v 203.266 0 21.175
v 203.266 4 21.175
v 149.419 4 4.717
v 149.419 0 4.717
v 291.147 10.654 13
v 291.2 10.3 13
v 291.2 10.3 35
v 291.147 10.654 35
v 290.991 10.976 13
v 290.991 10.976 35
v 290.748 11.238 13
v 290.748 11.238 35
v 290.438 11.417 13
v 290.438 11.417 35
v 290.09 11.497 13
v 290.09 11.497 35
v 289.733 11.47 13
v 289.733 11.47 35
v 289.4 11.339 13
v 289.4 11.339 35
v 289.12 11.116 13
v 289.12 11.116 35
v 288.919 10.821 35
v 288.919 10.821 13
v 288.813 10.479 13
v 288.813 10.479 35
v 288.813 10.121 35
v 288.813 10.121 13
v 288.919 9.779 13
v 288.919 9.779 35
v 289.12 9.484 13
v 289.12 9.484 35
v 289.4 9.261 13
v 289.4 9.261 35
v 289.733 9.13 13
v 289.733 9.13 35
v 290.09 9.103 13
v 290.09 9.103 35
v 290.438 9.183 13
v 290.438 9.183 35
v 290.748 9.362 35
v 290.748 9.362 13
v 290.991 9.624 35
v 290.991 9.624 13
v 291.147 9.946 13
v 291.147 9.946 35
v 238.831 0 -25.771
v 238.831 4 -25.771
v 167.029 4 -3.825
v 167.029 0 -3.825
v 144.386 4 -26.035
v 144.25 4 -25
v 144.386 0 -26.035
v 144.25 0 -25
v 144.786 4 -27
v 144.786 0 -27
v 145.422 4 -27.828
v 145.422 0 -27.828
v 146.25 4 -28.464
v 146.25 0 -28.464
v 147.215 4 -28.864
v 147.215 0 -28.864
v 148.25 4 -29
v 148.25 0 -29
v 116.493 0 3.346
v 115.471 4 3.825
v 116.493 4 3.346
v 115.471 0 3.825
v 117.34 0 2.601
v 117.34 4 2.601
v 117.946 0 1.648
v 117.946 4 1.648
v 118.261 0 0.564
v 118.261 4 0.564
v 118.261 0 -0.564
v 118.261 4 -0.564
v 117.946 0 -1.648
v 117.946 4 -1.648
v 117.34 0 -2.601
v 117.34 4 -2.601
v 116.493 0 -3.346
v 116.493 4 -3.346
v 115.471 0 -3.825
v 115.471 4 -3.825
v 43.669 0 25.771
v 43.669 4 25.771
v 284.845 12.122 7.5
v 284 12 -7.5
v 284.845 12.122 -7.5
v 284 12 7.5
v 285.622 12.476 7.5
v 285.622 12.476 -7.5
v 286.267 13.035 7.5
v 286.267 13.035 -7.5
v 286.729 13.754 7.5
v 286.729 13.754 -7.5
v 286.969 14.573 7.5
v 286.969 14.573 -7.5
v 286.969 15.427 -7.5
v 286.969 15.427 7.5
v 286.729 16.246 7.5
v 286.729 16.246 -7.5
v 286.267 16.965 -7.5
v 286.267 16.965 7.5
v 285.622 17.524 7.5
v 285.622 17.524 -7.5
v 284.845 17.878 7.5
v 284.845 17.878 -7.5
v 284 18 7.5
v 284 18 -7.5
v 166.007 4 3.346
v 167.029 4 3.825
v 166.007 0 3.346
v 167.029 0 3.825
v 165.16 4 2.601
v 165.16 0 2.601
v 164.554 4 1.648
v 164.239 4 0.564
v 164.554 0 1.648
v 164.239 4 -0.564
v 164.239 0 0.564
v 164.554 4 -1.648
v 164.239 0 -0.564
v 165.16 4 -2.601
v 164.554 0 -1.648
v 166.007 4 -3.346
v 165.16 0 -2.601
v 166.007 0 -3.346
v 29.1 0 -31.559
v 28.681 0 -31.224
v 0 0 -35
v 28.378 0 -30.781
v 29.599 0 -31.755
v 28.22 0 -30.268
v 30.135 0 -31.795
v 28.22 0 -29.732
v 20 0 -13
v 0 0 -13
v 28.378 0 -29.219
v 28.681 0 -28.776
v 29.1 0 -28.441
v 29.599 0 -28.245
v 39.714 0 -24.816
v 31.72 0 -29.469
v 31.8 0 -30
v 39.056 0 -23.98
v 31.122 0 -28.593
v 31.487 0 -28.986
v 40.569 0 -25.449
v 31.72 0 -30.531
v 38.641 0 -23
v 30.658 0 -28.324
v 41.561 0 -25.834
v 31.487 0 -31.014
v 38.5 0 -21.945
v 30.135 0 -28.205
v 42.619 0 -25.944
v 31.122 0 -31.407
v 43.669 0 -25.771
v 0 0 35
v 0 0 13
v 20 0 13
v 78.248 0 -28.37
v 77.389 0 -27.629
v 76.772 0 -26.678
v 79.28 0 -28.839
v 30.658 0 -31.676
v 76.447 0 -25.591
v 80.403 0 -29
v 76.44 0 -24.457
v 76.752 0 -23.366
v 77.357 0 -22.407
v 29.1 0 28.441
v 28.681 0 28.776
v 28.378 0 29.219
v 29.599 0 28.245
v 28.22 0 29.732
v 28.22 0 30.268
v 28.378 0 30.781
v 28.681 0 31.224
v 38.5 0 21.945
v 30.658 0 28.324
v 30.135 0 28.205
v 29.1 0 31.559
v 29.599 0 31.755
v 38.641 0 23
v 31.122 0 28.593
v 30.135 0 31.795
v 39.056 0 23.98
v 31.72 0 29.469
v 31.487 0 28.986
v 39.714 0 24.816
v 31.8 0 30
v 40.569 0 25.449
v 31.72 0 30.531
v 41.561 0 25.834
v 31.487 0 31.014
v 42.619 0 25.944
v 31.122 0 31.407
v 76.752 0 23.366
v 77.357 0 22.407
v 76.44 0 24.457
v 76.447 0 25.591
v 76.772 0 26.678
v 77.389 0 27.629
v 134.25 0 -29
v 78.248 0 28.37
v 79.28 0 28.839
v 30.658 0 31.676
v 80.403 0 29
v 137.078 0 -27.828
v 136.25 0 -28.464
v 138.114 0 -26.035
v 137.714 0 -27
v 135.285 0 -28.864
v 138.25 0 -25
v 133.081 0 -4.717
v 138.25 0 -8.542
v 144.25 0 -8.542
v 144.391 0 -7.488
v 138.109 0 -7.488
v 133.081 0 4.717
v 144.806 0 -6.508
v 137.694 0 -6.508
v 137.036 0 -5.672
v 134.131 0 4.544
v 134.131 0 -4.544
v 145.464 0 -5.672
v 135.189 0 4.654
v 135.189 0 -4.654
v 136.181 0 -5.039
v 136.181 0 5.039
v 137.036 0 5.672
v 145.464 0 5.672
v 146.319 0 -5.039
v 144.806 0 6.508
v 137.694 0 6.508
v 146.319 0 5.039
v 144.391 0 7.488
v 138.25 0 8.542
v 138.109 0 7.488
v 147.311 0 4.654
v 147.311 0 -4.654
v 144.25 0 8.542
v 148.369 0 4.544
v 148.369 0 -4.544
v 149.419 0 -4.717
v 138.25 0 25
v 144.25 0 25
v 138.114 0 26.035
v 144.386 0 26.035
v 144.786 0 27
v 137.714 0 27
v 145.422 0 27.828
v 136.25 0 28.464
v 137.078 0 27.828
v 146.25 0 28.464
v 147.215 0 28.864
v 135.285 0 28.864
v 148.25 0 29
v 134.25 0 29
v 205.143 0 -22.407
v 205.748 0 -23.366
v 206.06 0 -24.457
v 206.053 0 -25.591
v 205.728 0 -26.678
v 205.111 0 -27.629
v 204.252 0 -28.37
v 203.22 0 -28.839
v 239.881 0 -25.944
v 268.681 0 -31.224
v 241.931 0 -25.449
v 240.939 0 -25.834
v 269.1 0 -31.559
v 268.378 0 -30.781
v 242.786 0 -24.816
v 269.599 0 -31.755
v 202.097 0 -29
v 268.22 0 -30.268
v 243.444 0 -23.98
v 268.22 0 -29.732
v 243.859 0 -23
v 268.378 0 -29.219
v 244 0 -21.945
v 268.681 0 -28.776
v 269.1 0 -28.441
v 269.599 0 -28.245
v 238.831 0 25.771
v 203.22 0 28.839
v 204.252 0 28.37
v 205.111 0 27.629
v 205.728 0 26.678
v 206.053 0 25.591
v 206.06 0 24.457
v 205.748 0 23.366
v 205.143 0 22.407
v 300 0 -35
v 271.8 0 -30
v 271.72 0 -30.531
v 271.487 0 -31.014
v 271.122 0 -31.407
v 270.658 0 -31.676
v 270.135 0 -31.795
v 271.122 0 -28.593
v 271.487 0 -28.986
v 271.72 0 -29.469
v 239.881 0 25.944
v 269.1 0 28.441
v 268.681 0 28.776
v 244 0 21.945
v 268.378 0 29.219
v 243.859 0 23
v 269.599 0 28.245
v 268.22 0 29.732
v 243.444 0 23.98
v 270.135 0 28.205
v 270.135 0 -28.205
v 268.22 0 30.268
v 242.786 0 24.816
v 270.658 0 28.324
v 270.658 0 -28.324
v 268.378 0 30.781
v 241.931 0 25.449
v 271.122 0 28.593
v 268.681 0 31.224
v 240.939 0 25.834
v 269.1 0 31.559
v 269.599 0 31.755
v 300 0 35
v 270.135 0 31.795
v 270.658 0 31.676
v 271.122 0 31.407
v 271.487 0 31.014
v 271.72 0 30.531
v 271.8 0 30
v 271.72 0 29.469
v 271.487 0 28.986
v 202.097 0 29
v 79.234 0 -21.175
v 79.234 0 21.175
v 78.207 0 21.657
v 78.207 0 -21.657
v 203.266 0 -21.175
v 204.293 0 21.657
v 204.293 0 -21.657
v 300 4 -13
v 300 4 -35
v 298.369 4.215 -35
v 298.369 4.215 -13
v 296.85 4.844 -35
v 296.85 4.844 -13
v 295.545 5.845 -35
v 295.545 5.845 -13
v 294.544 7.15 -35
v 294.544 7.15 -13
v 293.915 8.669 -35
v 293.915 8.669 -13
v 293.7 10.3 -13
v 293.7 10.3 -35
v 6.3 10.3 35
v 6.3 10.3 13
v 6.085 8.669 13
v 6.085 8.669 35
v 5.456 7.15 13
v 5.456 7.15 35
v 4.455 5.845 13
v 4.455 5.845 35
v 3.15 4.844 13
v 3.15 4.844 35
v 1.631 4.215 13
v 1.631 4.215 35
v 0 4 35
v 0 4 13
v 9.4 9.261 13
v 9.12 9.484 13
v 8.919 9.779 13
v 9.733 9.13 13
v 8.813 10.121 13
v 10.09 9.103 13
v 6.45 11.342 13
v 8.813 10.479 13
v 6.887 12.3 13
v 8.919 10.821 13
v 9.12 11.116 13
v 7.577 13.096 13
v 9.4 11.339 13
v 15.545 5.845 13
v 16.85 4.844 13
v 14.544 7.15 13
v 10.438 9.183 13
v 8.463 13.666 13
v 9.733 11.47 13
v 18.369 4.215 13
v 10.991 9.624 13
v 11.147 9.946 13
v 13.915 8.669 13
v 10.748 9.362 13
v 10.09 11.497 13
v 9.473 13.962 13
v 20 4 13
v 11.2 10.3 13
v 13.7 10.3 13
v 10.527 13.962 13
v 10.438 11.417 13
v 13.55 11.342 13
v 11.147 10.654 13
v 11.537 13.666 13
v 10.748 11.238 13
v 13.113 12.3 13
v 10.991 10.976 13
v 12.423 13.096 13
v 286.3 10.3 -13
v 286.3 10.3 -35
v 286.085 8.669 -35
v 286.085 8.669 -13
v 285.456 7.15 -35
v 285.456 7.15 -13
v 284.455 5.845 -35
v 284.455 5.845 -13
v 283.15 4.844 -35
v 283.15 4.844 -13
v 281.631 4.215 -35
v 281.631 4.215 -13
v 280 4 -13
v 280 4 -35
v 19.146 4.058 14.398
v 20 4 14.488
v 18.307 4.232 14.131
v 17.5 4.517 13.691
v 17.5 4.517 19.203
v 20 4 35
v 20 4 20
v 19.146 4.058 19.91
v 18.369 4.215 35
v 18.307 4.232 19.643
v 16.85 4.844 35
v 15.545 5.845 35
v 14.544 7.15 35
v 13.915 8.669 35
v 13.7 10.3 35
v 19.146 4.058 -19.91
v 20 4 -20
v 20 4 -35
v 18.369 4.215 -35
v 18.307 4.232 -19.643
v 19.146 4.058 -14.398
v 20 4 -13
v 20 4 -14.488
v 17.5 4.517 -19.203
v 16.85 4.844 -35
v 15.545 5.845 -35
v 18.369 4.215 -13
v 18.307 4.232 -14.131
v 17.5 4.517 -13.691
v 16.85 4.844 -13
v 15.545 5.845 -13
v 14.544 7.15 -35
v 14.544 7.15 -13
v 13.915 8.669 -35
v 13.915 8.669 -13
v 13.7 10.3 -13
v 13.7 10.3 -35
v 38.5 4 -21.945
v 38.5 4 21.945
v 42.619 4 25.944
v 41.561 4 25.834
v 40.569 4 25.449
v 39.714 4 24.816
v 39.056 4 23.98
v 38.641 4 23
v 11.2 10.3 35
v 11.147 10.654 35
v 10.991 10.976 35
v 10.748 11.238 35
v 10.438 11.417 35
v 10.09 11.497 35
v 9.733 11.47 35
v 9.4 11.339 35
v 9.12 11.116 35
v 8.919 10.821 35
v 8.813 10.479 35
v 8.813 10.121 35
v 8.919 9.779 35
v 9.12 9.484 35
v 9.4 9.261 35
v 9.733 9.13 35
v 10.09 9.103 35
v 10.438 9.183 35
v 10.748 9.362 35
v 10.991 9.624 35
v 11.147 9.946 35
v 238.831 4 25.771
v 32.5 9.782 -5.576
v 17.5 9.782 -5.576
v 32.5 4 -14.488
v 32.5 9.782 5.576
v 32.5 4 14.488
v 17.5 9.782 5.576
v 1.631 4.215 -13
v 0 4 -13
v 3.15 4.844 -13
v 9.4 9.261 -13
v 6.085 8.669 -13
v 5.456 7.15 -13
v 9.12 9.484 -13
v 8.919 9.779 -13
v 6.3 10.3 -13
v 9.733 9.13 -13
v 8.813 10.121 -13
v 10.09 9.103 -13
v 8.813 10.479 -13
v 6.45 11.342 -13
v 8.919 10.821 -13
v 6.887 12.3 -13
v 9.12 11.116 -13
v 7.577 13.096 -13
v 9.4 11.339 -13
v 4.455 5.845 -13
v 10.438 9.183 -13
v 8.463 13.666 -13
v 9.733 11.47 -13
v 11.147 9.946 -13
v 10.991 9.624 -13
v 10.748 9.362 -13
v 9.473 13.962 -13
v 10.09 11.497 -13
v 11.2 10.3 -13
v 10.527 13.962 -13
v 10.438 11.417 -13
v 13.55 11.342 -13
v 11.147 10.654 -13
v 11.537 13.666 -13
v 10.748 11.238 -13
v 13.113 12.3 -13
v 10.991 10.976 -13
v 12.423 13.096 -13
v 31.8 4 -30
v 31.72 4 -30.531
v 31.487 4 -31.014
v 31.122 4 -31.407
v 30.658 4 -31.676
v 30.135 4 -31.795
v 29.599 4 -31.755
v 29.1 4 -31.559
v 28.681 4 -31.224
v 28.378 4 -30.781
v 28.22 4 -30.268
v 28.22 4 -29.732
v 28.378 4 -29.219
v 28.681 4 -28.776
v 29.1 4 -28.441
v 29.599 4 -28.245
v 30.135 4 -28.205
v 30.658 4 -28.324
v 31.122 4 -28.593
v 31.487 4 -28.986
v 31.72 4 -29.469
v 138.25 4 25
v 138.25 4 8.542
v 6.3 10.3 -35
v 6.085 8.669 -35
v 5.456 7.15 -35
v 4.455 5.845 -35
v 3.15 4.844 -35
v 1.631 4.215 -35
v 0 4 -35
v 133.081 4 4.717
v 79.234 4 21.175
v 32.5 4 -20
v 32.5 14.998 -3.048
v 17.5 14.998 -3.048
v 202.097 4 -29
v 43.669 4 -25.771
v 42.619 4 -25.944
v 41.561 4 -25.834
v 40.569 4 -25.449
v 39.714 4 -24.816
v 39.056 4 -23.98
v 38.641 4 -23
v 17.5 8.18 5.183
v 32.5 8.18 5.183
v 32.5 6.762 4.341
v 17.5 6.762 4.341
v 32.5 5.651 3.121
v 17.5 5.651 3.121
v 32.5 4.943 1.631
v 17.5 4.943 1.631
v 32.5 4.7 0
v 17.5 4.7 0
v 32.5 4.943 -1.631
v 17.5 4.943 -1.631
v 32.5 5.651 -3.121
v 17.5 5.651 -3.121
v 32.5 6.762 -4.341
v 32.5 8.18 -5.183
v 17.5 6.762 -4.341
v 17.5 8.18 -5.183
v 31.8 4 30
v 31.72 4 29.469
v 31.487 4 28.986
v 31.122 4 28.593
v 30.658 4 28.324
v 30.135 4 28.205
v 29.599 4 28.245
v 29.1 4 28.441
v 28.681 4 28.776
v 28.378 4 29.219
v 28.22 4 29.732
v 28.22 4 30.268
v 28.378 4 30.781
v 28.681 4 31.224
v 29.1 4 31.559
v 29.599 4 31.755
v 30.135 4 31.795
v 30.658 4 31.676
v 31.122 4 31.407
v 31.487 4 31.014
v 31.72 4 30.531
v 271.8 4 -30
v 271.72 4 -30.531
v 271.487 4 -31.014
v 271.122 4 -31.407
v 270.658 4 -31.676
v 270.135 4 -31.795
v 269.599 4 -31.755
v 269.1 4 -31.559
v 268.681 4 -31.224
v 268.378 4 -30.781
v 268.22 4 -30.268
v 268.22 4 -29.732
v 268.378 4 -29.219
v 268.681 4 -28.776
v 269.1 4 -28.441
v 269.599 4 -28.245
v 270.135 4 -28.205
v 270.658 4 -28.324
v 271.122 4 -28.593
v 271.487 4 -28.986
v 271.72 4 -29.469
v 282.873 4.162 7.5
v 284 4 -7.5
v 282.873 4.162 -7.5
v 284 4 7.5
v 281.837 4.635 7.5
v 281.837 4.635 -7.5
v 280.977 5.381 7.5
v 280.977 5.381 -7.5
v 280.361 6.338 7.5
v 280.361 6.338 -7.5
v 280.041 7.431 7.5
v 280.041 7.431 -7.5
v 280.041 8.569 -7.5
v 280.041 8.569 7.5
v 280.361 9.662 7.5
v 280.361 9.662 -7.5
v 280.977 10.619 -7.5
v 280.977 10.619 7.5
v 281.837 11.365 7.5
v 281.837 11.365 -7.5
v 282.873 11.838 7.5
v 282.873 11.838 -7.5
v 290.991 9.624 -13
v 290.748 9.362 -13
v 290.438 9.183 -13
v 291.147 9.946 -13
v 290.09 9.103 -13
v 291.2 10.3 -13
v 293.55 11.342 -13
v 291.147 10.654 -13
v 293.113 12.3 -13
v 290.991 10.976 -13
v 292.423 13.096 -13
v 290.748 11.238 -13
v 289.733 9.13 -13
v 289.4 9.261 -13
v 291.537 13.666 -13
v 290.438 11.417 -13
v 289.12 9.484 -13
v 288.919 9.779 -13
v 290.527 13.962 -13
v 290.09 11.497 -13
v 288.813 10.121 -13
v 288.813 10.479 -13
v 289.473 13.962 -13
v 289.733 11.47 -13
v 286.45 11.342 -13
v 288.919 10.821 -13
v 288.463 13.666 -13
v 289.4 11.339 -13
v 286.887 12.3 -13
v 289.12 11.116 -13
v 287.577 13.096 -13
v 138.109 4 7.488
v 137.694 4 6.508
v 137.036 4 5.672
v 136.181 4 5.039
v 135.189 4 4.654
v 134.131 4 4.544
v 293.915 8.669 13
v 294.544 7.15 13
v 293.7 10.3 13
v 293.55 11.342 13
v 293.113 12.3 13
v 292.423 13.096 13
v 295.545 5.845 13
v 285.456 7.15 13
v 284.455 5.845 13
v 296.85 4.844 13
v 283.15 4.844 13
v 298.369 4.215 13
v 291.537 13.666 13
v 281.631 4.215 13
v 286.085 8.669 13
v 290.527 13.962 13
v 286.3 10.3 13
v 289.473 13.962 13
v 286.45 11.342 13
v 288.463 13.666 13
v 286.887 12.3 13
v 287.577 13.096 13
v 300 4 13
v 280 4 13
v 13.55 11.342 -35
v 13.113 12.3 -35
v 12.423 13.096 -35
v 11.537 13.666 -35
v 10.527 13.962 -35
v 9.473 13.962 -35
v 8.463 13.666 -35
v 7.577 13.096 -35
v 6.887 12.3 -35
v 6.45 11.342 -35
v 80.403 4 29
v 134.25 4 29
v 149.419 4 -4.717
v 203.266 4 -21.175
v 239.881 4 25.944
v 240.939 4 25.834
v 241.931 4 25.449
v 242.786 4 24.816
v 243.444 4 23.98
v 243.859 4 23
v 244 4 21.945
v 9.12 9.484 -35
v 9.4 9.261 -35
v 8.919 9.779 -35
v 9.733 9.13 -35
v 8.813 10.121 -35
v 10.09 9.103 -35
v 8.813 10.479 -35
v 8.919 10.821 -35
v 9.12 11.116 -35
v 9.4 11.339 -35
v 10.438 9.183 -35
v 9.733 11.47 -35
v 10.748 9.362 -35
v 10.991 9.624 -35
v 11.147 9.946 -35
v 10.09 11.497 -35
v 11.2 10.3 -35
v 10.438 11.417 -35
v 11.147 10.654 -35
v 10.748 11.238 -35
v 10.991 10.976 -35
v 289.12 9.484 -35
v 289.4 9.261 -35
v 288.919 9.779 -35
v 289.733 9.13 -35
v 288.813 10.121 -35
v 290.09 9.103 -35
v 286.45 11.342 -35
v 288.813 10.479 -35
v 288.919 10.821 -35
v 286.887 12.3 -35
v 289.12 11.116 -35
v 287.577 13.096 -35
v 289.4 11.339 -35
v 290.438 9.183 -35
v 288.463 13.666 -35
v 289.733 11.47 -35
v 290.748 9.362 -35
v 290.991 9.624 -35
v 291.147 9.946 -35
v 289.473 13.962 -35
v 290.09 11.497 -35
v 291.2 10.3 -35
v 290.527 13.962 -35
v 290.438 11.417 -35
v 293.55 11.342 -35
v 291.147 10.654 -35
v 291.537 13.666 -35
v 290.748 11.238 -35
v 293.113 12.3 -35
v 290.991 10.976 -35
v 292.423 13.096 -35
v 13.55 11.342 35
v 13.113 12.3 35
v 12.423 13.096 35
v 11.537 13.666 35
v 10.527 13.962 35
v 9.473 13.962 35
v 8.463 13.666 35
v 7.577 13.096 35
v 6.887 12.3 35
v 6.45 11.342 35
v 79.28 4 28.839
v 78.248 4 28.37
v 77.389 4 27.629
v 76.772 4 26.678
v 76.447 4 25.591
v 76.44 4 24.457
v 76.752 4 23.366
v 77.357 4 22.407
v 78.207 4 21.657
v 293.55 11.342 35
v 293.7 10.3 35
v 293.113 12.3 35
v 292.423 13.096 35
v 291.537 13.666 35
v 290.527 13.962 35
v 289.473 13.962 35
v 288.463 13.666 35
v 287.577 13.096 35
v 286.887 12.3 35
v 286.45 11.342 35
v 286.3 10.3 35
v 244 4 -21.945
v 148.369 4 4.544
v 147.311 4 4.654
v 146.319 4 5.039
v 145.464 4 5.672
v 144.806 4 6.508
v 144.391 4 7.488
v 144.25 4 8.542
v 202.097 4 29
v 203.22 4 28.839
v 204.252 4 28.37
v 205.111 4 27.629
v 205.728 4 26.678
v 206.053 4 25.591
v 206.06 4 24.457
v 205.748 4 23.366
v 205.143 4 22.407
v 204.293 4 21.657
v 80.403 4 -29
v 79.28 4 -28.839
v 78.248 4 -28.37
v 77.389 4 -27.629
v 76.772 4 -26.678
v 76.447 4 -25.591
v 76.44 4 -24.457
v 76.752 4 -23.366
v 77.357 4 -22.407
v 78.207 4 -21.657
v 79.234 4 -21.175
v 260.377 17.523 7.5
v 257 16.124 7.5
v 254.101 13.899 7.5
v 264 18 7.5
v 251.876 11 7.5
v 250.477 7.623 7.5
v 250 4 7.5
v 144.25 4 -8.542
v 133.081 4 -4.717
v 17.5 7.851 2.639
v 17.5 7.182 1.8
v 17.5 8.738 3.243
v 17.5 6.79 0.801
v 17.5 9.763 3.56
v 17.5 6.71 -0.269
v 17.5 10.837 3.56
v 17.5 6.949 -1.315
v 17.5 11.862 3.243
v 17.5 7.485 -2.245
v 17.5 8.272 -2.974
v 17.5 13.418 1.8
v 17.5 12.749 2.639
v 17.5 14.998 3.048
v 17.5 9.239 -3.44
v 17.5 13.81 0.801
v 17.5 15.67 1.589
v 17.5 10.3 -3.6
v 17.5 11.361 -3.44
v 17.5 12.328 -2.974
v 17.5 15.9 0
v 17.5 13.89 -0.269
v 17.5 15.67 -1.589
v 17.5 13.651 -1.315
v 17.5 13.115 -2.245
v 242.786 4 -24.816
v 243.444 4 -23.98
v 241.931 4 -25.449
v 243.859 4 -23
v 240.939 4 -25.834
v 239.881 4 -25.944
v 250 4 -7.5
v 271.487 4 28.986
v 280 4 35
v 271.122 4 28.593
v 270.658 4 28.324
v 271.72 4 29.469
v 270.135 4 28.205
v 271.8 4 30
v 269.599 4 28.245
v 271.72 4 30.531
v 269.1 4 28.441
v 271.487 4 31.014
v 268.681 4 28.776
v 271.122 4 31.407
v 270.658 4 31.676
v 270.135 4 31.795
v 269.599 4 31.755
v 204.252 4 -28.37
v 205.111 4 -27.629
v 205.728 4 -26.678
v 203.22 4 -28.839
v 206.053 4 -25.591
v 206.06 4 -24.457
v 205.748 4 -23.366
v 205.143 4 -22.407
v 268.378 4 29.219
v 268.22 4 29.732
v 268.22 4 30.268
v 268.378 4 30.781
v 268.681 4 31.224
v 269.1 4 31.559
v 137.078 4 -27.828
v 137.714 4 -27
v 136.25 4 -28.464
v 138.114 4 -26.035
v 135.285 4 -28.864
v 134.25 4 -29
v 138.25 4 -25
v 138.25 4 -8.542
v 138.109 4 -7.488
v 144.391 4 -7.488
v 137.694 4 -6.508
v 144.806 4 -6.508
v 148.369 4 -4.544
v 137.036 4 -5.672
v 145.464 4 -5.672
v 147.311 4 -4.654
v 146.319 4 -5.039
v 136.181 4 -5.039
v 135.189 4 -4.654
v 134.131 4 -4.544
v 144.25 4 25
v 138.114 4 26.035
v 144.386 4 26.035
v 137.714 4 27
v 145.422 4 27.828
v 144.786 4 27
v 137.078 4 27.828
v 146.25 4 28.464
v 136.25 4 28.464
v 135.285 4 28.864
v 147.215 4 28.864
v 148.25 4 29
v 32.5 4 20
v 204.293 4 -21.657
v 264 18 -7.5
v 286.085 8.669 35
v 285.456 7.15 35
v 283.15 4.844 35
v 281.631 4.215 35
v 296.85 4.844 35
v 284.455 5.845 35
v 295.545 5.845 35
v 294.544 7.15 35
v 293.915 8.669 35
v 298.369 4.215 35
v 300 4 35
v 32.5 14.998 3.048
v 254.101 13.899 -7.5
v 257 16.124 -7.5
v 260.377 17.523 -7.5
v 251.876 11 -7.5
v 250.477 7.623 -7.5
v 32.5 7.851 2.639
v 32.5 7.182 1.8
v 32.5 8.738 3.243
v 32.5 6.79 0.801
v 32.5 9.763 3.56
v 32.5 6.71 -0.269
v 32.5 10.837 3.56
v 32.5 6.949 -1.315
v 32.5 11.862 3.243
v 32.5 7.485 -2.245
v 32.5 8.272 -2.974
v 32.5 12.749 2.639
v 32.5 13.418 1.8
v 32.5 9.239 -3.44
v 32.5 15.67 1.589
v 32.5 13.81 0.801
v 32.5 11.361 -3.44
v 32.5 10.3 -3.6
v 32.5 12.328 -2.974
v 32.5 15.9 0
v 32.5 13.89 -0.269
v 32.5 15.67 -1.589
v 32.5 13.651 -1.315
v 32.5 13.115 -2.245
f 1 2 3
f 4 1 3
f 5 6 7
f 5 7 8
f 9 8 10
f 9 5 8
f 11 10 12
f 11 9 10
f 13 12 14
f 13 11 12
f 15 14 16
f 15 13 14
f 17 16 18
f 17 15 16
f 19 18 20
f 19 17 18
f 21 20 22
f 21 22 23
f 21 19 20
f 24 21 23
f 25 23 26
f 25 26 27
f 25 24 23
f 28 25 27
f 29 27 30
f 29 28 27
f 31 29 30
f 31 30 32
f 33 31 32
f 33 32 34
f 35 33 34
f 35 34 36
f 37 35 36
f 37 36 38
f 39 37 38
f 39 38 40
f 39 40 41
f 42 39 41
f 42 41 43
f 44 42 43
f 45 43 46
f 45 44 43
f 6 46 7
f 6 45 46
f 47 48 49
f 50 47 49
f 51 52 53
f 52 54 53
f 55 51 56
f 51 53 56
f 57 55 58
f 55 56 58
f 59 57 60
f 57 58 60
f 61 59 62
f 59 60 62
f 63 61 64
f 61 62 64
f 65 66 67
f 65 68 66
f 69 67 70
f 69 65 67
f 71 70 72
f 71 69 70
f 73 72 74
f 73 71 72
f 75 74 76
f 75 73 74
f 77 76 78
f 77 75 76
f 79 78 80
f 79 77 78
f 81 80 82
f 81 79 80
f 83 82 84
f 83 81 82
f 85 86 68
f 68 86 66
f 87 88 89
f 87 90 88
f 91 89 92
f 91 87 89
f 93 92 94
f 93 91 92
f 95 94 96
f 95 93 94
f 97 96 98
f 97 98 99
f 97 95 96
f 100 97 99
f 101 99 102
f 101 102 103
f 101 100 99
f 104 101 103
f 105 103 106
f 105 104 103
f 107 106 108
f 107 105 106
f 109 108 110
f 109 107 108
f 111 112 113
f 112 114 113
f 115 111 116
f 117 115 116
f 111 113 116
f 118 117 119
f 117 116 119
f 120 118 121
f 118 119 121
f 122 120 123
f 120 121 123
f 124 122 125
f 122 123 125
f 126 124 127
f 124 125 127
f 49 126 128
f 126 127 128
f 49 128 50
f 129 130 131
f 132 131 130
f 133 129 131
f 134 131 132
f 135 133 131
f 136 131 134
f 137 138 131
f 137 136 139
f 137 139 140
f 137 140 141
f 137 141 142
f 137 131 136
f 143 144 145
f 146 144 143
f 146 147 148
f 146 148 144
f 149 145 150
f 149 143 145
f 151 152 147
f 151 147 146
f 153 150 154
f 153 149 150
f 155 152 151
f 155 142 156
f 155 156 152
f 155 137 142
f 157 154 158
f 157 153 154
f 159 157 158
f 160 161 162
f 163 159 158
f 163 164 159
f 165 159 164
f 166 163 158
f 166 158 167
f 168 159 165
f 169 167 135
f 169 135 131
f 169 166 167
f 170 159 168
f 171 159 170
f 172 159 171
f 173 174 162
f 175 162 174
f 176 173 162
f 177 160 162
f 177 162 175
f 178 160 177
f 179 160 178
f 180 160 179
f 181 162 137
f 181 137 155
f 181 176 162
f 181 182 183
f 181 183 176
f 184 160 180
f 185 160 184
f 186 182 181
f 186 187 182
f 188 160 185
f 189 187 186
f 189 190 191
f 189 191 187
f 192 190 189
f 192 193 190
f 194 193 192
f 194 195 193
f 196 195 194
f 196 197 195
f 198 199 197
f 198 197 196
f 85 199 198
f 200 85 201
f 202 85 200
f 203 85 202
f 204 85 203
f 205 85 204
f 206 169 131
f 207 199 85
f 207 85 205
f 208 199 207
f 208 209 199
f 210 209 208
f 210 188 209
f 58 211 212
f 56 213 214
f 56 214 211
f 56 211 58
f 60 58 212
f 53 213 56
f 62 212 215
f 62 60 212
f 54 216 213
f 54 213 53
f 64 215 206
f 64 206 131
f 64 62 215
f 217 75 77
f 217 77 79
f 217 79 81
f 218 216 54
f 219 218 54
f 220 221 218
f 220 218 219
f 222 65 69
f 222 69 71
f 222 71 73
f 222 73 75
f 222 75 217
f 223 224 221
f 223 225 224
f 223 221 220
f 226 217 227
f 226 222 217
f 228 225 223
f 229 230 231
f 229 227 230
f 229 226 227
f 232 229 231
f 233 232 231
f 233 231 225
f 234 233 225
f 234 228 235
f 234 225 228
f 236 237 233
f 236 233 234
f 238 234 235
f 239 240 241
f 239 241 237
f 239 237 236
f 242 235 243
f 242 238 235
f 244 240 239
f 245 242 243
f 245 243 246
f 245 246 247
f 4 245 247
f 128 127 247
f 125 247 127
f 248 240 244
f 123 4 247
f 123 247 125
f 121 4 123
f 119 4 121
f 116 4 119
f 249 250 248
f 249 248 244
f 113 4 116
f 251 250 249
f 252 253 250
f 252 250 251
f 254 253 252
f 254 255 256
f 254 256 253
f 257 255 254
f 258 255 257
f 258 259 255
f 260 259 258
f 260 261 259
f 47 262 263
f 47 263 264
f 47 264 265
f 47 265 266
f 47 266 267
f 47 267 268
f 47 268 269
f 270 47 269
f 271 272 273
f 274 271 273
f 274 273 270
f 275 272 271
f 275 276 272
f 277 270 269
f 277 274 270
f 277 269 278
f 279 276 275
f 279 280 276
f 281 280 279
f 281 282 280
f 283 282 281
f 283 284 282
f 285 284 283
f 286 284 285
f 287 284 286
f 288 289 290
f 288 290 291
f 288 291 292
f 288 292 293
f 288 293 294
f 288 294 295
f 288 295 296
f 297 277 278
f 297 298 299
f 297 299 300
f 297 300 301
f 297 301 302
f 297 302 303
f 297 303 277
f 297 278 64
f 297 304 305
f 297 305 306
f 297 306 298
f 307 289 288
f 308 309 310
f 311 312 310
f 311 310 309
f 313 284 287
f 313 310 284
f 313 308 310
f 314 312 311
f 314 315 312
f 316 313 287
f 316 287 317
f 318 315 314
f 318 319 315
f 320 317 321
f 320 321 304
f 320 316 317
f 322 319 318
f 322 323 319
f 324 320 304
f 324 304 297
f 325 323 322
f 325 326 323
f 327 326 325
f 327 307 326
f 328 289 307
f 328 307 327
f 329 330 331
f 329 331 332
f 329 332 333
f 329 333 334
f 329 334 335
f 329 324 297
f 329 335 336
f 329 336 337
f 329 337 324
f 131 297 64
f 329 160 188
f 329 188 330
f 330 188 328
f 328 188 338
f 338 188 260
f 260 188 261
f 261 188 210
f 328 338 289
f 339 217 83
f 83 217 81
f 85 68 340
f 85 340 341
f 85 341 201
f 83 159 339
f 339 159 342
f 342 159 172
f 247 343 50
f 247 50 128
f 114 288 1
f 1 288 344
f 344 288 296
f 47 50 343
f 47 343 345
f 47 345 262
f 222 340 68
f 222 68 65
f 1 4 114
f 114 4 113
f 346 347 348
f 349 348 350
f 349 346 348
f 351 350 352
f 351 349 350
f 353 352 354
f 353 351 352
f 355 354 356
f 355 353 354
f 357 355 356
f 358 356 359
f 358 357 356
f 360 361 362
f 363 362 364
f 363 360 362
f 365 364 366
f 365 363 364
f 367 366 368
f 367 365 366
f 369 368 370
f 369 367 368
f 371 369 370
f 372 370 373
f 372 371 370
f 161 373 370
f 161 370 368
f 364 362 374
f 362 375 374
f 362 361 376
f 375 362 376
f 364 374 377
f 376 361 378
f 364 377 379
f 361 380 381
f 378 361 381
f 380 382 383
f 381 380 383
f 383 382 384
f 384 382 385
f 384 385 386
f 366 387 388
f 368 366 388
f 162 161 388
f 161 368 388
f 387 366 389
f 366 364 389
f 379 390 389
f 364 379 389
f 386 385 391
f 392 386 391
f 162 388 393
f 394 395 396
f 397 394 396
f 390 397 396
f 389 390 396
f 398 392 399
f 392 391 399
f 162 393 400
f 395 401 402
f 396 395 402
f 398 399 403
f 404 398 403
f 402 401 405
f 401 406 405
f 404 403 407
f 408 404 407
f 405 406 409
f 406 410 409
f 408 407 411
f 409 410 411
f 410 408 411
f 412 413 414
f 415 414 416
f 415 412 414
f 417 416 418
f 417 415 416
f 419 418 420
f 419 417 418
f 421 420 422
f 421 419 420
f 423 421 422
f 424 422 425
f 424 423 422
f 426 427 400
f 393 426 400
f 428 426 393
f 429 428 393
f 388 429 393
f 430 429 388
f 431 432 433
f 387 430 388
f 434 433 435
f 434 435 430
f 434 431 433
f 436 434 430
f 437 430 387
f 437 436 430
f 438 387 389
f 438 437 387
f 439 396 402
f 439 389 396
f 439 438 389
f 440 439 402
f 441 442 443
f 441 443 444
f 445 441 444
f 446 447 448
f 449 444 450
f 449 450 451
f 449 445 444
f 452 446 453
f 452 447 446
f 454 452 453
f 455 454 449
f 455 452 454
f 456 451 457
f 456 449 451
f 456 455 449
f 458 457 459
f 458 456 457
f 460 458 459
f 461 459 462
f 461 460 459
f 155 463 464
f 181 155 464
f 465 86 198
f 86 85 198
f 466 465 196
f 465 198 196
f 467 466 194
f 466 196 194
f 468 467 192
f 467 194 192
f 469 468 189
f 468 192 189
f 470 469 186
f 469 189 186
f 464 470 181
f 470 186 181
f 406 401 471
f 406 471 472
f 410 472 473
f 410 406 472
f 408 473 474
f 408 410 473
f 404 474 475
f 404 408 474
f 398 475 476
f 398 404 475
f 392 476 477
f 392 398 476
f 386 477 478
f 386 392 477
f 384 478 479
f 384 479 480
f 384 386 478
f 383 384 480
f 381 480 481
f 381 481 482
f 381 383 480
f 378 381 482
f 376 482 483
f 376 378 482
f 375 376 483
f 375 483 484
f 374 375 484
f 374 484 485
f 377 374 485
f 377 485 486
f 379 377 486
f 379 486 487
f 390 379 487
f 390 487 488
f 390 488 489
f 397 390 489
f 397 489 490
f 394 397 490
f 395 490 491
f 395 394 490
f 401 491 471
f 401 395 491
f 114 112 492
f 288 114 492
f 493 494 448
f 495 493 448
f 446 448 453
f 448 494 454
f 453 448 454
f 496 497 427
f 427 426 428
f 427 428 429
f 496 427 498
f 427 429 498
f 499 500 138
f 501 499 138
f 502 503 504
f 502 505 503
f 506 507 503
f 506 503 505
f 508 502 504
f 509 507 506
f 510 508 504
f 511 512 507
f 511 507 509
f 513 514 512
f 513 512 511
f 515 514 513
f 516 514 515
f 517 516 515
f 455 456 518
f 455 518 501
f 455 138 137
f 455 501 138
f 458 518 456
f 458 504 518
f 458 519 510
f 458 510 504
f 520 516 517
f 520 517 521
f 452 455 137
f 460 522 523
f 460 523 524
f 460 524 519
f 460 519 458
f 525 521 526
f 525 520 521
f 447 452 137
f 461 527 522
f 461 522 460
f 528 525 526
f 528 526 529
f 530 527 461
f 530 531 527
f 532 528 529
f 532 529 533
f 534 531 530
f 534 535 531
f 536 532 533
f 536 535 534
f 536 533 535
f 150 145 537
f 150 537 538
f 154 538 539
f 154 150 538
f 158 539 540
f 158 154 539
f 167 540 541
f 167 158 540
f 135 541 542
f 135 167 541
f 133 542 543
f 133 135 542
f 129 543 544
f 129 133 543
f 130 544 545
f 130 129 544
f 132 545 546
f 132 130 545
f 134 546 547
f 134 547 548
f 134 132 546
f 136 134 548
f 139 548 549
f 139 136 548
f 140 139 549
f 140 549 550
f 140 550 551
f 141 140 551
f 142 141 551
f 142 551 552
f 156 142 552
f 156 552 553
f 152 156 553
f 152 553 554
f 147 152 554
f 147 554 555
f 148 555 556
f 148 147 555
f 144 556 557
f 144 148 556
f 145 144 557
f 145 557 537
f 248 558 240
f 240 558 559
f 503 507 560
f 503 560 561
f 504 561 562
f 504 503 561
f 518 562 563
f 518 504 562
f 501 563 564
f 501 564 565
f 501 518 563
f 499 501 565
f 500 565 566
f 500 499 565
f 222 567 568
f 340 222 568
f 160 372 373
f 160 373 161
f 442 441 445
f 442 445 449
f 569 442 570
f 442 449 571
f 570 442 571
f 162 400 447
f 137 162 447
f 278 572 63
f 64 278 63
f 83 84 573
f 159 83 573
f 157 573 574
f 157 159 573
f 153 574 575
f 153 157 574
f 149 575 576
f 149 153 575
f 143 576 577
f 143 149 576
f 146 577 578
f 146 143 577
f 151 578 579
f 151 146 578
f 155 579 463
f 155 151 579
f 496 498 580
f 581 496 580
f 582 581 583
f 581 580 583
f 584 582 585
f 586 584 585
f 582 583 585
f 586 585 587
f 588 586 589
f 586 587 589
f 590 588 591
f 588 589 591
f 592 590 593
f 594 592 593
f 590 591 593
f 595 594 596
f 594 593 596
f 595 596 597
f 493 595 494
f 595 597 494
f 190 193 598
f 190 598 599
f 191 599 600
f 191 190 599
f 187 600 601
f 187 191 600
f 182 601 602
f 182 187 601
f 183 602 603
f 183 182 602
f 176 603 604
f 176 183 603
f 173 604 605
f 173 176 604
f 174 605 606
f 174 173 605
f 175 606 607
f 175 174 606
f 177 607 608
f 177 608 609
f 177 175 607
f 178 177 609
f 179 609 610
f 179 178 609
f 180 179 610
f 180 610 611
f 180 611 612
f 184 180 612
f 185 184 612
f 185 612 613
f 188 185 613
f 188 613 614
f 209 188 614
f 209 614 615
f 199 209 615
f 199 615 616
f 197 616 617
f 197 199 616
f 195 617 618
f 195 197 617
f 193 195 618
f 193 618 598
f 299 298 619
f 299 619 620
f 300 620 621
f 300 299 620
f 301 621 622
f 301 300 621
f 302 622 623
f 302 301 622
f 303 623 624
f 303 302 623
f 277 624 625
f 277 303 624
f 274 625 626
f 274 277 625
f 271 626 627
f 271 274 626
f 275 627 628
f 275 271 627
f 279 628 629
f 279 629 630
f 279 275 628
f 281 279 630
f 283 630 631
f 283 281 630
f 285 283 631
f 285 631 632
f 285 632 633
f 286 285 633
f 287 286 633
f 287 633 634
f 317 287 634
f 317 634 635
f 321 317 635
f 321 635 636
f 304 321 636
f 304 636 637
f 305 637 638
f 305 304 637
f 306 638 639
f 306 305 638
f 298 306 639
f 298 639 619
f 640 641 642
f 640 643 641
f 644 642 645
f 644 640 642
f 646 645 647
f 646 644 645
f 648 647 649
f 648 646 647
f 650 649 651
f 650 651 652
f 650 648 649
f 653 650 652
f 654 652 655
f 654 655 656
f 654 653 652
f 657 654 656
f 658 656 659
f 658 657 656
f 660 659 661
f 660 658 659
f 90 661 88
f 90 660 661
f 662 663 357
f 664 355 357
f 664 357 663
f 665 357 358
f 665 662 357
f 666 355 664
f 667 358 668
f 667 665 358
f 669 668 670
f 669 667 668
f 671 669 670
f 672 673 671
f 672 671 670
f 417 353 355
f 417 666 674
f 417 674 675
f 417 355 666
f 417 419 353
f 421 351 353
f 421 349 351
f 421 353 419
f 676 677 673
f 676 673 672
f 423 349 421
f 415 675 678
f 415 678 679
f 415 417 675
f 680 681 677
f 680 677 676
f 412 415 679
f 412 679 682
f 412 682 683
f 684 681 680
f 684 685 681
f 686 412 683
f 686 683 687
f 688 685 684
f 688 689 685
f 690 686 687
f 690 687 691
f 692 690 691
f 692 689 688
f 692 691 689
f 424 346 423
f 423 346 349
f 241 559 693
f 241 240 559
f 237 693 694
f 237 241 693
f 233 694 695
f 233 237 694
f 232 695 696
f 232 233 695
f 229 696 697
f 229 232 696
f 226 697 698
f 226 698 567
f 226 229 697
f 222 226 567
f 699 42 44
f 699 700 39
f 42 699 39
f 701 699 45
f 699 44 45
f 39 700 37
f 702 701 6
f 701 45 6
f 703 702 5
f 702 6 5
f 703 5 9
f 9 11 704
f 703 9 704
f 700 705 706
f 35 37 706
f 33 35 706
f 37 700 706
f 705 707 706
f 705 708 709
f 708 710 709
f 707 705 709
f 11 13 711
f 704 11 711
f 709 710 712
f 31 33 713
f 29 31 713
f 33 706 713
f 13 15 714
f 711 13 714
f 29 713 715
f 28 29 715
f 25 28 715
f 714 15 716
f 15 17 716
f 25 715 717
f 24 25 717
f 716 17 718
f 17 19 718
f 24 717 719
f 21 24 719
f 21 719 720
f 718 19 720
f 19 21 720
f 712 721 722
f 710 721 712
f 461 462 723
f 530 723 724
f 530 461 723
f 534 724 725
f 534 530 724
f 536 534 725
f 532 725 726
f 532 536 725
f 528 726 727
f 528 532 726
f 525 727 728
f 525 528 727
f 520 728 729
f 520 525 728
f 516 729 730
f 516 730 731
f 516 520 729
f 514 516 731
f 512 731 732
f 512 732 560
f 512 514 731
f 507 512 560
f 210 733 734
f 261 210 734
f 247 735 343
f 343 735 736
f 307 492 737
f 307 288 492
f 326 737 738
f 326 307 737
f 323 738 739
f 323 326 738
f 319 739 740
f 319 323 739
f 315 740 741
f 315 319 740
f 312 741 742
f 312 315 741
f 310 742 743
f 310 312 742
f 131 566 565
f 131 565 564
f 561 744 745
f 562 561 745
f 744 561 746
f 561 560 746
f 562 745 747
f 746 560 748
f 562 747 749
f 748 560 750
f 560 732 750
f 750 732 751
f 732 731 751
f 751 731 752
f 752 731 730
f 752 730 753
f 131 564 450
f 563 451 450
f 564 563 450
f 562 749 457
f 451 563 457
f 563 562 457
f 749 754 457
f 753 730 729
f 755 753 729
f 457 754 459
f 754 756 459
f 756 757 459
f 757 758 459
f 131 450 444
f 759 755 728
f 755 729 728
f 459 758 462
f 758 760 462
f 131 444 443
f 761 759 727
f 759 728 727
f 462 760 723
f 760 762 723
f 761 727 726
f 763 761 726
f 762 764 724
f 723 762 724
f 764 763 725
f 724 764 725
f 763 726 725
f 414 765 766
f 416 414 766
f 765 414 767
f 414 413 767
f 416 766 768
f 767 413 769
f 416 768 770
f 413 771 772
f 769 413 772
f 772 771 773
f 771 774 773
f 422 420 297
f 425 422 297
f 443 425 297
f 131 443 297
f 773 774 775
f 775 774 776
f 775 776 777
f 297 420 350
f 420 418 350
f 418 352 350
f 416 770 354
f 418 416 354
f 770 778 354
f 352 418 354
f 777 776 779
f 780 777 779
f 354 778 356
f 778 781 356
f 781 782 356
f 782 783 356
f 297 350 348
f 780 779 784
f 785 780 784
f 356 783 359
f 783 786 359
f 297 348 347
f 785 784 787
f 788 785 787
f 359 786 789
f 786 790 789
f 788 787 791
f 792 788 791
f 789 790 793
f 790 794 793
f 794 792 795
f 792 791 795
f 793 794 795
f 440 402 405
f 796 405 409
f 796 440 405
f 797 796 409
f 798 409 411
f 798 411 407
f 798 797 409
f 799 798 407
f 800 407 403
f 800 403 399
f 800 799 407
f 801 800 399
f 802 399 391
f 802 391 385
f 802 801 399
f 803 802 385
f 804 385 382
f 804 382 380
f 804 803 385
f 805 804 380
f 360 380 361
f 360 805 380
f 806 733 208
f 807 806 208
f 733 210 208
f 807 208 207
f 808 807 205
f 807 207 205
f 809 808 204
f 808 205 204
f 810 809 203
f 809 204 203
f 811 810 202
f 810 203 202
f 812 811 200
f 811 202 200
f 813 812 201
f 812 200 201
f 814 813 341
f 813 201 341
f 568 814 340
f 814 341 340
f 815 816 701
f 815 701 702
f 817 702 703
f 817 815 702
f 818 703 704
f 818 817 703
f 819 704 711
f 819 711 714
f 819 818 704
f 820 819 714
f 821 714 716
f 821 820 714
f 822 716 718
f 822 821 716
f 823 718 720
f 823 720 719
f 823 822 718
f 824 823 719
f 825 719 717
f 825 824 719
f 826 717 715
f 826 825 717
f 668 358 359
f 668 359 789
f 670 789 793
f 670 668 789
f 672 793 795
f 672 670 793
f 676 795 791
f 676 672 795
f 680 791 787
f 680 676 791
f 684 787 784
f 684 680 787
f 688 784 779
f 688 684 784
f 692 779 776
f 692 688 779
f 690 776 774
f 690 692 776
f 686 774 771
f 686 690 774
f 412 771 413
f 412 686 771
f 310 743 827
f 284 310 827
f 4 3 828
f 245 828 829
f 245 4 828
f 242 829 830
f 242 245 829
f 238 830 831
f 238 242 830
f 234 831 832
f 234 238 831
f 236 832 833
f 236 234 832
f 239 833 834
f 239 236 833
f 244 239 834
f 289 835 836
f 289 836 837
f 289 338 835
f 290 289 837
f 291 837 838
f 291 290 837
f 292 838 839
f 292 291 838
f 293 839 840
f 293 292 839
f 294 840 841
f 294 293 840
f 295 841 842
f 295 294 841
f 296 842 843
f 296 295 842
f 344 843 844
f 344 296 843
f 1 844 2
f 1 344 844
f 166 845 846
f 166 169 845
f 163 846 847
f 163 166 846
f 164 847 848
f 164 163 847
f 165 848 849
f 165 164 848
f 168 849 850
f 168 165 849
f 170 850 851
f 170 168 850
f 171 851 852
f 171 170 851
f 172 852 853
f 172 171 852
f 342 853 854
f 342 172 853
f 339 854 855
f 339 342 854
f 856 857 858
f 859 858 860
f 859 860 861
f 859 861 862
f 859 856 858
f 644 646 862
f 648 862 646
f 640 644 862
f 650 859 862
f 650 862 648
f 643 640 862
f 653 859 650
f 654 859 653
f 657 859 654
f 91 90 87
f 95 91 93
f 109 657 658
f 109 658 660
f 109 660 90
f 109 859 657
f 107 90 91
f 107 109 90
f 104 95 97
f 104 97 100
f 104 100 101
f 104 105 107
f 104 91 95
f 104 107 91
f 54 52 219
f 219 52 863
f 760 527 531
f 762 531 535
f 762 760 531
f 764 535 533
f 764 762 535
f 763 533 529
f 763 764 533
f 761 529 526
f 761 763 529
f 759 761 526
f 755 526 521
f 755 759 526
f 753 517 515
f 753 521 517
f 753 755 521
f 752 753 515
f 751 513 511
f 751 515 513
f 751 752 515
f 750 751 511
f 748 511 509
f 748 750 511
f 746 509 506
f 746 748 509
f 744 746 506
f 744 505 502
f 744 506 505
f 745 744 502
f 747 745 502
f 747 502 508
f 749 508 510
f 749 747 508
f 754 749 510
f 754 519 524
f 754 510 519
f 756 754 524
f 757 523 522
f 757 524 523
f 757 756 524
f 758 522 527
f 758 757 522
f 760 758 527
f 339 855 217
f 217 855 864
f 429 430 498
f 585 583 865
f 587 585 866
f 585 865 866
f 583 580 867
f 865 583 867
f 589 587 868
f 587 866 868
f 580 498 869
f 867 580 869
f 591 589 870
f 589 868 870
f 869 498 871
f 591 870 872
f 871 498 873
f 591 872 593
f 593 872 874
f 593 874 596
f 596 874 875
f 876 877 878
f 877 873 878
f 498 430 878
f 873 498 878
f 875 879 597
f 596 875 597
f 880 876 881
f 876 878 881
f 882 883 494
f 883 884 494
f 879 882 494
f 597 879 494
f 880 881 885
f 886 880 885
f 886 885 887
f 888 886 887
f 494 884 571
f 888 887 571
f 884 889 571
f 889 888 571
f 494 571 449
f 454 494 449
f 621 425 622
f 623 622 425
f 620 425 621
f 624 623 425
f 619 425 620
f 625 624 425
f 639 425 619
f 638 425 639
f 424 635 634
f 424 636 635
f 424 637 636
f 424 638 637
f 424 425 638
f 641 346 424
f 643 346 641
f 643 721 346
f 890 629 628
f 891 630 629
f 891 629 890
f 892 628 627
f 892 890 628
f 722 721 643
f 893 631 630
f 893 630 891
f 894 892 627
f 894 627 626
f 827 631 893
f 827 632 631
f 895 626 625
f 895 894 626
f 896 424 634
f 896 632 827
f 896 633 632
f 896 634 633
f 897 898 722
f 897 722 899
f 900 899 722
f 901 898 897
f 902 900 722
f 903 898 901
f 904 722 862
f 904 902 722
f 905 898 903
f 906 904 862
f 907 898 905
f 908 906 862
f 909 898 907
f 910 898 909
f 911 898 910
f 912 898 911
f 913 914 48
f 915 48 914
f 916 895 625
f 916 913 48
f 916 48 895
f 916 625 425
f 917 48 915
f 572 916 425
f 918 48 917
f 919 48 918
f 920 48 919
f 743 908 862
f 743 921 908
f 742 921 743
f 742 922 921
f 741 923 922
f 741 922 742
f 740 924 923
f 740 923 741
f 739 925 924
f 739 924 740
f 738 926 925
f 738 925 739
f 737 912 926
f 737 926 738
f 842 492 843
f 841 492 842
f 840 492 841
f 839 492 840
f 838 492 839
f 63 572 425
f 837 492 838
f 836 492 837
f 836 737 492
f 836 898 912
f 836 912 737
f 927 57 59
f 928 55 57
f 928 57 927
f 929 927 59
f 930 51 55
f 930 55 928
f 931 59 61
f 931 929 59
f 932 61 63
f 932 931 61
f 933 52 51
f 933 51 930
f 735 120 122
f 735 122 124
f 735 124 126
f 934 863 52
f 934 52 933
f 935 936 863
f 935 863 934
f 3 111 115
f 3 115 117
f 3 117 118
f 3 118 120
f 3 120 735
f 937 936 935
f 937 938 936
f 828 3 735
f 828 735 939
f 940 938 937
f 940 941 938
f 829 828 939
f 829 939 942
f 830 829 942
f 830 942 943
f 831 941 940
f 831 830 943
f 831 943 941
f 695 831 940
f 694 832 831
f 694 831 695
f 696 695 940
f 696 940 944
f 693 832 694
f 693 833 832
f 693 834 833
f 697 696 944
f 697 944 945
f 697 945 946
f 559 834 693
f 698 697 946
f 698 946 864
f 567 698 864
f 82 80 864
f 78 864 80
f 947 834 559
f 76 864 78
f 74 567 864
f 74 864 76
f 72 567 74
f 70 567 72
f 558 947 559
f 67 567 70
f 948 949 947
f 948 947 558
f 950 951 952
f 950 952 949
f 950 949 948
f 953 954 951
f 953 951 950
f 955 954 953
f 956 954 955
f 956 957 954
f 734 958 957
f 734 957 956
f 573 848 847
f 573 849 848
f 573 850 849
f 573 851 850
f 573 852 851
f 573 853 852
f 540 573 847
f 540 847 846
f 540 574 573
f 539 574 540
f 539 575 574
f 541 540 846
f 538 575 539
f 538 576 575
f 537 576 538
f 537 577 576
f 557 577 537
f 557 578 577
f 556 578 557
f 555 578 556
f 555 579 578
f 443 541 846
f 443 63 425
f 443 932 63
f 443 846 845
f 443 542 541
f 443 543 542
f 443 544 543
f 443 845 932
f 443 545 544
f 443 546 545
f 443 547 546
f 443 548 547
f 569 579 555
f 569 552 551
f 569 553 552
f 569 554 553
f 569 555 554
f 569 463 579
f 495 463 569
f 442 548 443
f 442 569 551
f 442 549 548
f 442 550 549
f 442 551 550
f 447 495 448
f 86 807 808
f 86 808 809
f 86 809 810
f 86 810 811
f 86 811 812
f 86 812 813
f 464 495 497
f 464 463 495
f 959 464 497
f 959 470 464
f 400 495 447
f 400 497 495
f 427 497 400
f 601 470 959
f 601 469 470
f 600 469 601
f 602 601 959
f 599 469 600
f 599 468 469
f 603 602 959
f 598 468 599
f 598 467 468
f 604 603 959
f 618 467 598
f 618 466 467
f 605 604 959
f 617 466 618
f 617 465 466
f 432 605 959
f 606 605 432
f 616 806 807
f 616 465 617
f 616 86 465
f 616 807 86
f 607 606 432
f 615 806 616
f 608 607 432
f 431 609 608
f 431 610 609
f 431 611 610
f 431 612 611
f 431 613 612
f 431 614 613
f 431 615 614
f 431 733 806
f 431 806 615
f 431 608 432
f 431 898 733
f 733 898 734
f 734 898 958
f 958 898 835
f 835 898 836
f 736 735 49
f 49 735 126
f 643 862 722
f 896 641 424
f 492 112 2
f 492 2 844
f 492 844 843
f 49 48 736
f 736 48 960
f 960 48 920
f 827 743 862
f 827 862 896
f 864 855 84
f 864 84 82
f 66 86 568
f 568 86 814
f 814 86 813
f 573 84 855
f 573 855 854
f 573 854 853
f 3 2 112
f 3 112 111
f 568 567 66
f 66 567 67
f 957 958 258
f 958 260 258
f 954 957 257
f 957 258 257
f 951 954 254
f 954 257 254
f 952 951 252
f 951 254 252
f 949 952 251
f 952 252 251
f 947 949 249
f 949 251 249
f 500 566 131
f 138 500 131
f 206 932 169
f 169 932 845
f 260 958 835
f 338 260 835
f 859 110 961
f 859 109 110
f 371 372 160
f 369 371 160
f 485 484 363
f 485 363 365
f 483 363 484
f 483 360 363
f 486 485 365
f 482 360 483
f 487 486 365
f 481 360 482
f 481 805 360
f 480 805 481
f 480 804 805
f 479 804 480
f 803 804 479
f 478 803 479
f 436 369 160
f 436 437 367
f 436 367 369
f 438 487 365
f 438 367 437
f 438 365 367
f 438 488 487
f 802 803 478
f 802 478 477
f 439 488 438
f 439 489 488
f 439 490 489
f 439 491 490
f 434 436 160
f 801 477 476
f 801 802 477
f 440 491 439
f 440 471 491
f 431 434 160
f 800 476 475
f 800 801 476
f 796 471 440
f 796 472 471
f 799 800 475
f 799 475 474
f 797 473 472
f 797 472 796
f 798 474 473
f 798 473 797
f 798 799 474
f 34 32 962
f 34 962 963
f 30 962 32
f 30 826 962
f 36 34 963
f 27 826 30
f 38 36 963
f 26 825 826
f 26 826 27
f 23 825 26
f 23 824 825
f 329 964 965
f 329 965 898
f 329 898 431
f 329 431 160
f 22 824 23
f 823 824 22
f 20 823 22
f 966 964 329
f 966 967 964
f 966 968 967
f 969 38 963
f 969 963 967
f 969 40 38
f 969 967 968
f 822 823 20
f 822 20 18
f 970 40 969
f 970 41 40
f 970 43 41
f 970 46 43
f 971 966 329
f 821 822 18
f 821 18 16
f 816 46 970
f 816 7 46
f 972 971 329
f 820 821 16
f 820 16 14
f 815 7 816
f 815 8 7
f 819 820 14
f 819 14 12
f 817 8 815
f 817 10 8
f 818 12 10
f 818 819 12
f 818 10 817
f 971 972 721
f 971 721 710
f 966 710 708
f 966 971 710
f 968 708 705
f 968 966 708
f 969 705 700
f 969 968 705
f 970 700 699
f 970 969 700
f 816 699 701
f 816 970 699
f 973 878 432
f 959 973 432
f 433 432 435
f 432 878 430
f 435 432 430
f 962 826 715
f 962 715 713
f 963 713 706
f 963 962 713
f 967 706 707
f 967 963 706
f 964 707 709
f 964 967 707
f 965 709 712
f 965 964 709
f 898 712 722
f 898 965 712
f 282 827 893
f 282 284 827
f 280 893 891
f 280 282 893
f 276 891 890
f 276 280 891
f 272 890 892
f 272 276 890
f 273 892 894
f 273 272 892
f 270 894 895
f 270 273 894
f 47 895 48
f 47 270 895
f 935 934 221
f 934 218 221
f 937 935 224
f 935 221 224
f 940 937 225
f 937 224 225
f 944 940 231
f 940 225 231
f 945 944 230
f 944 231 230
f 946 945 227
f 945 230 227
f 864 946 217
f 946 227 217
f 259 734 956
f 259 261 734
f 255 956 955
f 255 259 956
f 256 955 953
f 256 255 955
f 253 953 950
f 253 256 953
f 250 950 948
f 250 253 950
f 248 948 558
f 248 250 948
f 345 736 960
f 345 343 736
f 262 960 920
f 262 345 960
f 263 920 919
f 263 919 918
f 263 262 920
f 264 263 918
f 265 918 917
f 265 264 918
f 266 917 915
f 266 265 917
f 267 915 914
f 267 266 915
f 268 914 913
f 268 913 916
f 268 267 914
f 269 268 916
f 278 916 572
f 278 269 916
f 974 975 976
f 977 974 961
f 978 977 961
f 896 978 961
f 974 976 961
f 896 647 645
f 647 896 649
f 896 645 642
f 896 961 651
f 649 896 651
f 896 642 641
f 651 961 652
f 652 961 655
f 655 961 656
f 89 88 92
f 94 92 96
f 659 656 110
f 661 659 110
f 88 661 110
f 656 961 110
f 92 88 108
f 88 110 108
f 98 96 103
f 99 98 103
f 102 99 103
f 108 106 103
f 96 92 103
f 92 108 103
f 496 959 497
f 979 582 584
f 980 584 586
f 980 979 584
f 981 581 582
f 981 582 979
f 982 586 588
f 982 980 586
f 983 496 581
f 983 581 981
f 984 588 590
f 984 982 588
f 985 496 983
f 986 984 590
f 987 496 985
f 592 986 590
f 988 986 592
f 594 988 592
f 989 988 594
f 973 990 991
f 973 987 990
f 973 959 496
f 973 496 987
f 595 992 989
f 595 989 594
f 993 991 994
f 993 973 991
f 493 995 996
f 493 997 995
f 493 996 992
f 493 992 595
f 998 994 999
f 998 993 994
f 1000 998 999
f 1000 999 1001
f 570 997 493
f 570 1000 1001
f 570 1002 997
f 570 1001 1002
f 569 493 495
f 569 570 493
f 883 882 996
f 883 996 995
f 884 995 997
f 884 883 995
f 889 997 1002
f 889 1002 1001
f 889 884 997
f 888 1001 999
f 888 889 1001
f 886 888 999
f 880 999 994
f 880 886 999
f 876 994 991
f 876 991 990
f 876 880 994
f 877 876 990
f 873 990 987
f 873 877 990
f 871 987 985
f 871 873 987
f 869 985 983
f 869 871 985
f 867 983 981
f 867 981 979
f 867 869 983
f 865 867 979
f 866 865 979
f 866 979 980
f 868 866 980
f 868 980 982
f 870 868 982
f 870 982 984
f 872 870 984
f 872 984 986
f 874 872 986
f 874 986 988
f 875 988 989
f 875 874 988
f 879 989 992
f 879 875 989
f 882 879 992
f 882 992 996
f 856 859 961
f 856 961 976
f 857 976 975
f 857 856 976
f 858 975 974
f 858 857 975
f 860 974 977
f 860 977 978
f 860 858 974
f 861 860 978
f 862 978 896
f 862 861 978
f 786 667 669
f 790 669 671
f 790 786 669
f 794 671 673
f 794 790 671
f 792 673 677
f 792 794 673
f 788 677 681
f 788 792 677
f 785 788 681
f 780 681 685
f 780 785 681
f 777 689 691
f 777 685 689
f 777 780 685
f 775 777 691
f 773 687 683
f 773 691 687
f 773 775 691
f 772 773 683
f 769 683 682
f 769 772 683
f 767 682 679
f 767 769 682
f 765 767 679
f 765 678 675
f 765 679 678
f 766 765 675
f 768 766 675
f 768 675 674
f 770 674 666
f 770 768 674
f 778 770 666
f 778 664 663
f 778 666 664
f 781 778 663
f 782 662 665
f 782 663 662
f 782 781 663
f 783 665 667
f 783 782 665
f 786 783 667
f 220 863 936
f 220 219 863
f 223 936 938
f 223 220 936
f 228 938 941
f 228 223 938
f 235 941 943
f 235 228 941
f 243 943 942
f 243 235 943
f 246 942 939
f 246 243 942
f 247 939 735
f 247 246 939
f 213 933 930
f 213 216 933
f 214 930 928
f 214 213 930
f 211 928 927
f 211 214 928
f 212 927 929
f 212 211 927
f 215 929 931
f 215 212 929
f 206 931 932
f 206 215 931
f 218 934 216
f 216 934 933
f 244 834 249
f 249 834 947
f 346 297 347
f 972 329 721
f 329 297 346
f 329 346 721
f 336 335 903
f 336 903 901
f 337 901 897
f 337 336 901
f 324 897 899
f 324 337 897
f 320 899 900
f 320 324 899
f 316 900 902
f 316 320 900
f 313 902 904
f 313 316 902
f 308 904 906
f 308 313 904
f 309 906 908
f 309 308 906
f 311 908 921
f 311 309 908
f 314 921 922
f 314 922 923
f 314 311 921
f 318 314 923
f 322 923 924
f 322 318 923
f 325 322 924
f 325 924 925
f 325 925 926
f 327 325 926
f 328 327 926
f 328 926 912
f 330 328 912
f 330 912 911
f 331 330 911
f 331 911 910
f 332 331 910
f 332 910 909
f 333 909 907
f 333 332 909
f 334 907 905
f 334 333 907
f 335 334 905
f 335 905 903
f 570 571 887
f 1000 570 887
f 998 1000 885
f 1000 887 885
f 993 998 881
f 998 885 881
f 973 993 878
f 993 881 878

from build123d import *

# Parameters (mm, degrees)
SKETCH1_R                    = 1.2
BOSS_EXTRUDE1_DEPTH          = 35
SKETCH2_W                    = 26
SKETCH2_H                    = 10
CUT_EXTRUDE1_DEPTH           = 303.359058075
BOSS_EXTRUDE2_DEPTH          = 7.5
SKETCH4_W                    = 20
SKETCH4_H                    = 26
CUT_EXTRUDE2_DEPTH           = 303.359058075
BOSS_EXTRUDE3_START          = 17.5
SKETCH6_R                    = 3.6
BOSS_EXTRUDE3_DEPTH          = 15
M3_CLEARANCE_HOLE1_OUTLINE_R = 1.8
M3_CLEARANCE_HOLE1_DEPTH     = 4
CUT_EXTRUDE7_DEPTH           = 303.359058075
FILLET8_R                    = 4


# Read off the part's stored shape, not the designer's step: M3 Clearance Hole1
with BuildPart() as part:
    # Sketch1 → Boss-Extrude1 (new, symmetric)
    with BuildSketch(Plane.XY):
        with BuildLine():
            Line((0, 0), (300, 0))
            Line((300, 0), (300, 4))
            ThreePointArc((300, 4), (295.545227279, 5.845227279), (293.7, 10.3))
            ThreePointArc((293.7, 10.3), (290, 14), (286.3, 10.3))
            ThreePointArc((286.3, 10.3), (284.454772721, 5.845227279), (280, 4))
            Line((280, 4), (20, 4))
            ThreePointArc((20, 4), (15.545227279, 5.845227279), (13.7, 10.3))
            ThreePointArc((13.7, 10.3), (10, 14), (6.3, 10.3))
            ThreePointArc((6.3, 10.3), (4.454772721, 5.845227279), (0, 4))
            Line((0, 4), (0, 0))
        make_face()
        with Locations((10, 10.3)):
            Circle(SKETCH1_R, mode=Mode.SUBTRACT)
        with Locations((290, 10.3)):
            Circle(SKETCH1_R, mode=Mode.SUBTRACT)
    extrude(amount=BOSS_EXTRUDE1_DEPTH, both=True)

    # Sketch2 → Cut-Extrude1 (cut, through all)
    with BuildSketch(Plane(origin=(0, 0, 0), x_dir=(0, 0, -1), z_dir=(1, 0, 0))):
        with Locations((0, 9)):
            Rectangle(SKETCH2_W, SKETCH2_H)
    extrude(amount=CUT_EXTRUDE1_DEPTH, mode=Mode.SUBTRACT)

    # Sketch3 → Boss-Extrude2 (add, symmetric)
    with BuildSketch(Plane.XY):
        with BuildLine():
            Line((284, 18), (264, 18))
            ThreePointArc((264, 18), (254.100505063, 13.899494937), (250, 4))
            Line((250, 4), (284, 4))
            ThreePointArc((284, 4), (280, 8), (284, 12))
            ThreePointArc((284, 12), (287, 15), (284, 18))
        make_face()
    extrude(amount=BOSS_EXTRUDE2_DEPTH, both=True)

    # Sketch4 → Cut-Extrude2 (cut, through all)
    with BuildSketch(Plane(origin=(0, 4, 0), x_dir=(1, 0, 0), z_dir=(0, 1, 0))):
        with Locations((10, 0)):
            Rectangle(SKETCH4_W, SKETCH4_H)
    extrude(amount=-CUT_EXTRUDE2_DEPTH, mode=Mode.SUBTRACT)

    # Sketch6 → Boss-Extrude3 (add)
    with BuildSketch(Plane(origin=(0, 0, 0), x_dir=(0, 0, -1), z_dir=(1, 0, 0)).offset(BOSS_EXTRUDE3_START)):
        with BuildLine():
            Line((-14.487917861, 4), (-5.57596765, 9.781748355))
            ThreePointArc((-5.57596765, 9.781748355), (0, 4.7), (5.57596765, 9.781748355))
            Line((5.57596765, 9.781748355), (14.487917861, 4))
            Line((14.487917861, 4), (20, 4))
            Line((20, 4), (3.047850082, 14.997936768))
            ThreePointArc((3.047850082, 14.997936768), (0, 15.9), (-3.047850082, 14.997936768))
            Line((-3.047850082, 14.997936768), (-20, 4))
            Line((-20, 4), (-14.487917861, 4))
        make_face()
        with Locations((0, 10.3)):
            Circle(SKETCH6_R, mode=Mode.SUBTRACT)
    extrude(amount=BOSS_EXTRUDE3_DEPTH)

    # M3 Clearance Hole1 outline → M3 Clearance Hole1 (cut)
    with BuildSketch(Plane(origin=(0, 0, 0), x_dir=(1, 0, 0), z_dir=(0, 1, 0))):
        with Locations((30, -30)):
            Circle(M3_CLEARANCE_HOLE1_OUTLINE_R)
        with Locations((270, 30)):
            Circle(M3_CLEARANCE_HOLE1_OUTLINE_R)
        with Locations((270, -30)):
            Circle(M3_CLEARANCE_HOLE1_OUTLINE_R)
        with Locations((30, 30)):
            Circle(M3_CLEARANCE_HOLE1_OUTLINE_R)
    extrude(amount=M3_CLEARANCE_HOLE1_DEPTH, mode=Mode.SUBTRACT)

    # Sketch12 → Cut-Extrude7 (cut, through all)
    with BuildSketch(Plane(origin=(0, 4, 0), x_dir=(1, 0, 0), z_dir=(0, 1, 0))):
        Polygon((53.630917429, -29), (138.25, -29), (138.25, -3.136996028), align=None)
        Polygon((38.5, -27.350626478), (127.986315, 0), (38.5, 27.350626478), align=None)
        Polygon((138.25, 3.136996028), (138.25, 29), (53.630917429, 29), align=None)
        Polygon((144.25, 29), (144.25, 3.136996028), (228.869082571, 29), align=None)
        Polygon((154.513685, 0), (244, -27.350626478), (244, 27.350626478), align=None)
        Polygon((144.25, -29), (228.869082571, -29), (144.25, -3.136996028), align=None)
    extrude(amount=-CUT_EXTRUDE7_DEPTH, mode=Mode.SUBTRACT)

    # Fillet8
    fillet8_edges = [part.edges().sort_by_distance(p)[0] for p in [
        (53.630917429, 2, -29),
        (138.25, 2, -29),
        (138.25, 2, -3.136996028),
        (38.5, 2, 27.350626478),
        (38.5, 2, -27.350626478),
        (127.986315, 2, 0),
        (244, 2, 27.350626478),
        (154.513685, 2, 0),
        (244, 2, -27.350626478),
        (144.25, 2, -29),
        (228.869082571, 2, -29),
        (144.25, 2, -3.136996028),
        (144.25, 2, 29),
        (144.25, 2, 3.136996028),
        (228.869082571, 2, 29),
        (53.630917429, 2, 29),
        (138.25, 2, 3.136996028),
        (138.25, 2, 29),
    ]]
    fillet(fillet8_edges, radius=FILLET8_R)


solid = part.part
